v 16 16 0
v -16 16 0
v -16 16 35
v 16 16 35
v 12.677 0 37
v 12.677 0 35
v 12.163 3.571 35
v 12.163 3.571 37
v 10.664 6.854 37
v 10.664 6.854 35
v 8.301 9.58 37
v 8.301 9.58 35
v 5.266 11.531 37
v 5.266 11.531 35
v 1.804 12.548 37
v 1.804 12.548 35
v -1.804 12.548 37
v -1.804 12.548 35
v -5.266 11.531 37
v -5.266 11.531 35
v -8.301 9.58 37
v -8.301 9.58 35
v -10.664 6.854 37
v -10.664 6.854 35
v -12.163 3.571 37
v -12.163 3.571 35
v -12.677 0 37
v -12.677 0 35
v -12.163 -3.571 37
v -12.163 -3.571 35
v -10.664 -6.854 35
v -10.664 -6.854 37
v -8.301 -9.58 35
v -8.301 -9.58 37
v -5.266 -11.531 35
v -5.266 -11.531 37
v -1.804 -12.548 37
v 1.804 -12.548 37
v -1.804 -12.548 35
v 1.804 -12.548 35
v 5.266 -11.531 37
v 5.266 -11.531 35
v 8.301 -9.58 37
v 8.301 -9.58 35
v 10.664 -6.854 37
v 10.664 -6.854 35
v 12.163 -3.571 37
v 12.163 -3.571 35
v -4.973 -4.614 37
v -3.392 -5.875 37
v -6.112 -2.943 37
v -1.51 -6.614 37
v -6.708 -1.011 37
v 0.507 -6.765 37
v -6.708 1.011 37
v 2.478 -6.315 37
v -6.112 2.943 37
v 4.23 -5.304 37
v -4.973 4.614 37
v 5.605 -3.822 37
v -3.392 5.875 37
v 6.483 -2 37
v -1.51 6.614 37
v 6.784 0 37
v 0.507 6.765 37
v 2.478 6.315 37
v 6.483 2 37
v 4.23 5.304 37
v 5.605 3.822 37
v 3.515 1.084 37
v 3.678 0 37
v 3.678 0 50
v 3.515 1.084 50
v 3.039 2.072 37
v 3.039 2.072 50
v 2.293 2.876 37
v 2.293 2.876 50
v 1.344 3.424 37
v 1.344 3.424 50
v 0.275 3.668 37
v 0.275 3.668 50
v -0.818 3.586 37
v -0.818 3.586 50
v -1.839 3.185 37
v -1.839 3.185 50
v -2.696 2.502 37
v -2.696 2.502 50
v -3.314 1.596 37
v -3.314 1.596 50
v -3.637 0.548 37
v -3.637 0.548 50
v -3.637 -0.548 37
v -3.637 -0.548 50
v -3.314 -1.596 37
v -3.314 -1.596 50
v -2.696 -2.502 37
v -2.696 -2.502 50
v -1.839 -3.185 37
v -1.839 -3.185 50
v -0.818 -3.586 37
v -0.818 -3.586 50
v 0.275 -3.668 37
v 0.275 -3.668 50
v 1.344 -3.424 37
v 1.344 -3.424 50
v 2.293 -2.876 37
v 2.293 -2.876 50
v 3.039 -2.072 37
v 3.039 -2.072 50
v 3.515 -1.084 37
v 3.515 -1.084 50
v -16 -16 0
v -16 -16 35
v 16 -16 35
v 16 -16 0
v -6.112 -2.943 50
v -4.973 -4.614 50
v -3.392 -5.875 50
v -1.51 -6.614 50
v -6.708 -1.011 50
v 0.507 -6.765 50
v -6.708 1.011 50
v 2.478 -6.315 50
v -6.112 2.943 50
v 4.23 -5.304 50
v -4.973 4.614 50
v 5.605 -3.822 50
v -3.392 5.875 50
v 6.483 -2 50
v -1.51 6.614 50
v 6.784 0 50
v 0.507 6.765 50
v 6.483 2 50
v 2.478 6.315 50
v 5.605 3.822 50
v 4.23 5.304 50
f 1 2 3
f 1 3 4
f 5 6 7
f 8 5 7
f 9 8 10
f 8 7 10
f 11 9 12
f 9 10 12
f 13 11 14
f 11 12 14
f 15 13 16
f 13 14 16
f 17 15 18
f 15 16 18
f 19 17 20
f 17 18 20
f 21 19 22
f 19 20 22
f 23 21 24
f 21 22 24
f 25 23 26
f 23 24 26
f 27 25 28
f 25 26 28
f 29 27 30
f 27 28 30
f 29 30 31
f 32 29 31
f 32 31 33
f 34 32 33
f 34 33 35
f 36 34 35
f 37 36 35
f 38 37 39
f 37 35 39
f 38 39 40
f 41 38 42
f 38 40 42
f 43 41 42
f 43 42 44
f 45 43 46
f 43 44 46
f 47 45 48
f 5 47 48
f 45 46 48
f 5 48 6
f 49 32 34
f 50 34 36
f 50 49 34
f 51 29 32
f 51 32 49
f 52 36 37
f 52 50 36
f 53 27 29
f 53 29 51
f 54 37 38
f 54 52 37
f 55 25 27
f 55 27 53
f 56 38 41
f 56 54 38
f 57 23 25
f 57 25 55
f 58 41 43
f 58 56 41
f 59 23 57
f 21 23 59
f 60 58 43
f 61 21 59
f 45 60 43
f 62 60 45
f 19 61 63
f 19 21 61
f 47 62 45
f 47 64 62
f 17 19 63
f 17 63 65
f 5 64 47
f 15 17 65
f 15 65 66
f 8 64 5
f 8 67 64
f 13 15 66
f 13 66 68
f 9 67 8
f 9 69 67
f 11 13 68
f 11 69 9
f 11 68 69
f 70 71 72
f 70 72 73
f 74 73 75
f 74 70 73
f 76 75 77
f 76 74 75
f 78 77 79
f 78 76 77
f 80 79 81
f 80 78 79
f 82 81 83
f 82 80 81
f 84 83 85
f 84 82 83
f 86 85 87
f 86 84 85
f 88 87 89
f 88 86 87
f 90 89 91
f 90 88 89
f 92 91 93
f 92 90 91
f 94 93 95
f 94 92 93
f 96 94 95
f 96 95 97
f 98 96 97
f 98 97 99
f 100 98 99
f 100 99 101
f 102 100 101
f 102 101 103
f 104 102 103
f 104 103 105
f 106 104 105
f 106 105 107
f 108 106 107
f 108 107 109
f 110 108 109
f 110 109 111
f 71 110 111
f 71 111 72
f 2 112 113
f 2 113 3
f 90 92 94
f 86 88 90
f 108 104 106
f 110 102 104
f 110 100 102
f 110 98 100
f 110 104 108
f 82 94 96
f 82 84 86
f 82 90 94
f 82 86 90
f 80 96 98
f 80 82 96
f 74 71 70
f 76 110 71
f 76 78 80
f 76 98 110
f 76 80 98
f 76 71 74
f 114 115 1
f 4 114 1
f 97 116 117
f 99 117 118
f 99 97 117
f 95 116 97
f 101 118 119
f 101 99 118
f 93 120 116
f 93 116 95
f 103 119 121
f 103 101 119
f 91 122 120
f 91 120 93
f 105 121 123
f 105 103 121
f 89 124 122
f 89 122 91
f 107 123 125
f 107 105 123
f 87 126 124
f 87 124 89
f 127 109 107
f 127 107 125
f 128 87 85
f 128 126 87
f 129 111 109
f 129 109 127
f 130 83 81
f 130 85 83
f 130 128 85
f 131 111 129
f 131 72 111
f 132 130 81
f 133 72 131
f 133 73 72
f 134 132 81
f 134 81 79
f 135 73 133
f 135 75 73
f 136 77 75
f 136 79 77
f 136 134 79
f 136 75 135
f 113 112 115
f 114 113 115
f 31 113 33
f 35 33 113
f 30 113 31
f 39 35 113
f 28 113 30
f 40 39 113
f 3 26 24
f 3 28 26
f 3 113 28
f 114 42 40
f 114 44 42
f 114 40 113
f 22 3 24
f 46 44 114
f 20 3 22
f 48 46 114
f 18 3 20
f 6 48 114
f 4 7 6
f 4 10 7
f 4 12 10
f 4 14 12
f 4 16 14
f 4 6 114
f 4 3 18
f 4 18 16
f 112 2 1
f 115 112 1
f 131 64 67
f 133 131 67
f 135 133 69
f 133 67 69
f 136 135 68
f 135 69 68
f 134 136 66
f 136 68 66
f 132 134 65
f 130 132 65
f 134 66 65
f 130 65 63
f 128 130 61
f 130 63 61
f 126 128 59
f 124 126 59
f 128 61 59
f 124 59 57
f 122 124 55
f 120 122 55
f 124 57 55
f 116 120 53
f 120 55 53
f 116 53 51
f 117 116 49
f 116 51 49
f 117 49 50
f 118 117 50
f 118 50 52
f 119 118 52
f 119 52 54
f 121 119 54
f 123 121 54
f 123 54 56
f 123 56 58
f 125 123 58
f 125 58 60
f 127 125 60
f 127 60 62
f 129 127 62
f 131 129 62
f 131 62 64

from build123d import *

# Parameters (mm, degrees)
ESQUISSE1_W        = 32
ESQUISSE1_H        = 32
BOSS_EXTRU_1_DEPTH = 35
ESQUISSE2_R        = 6.784029575
ESQUISSE2_R_2      = 3.677937746
BOSS_EXTRU_2_DEPTH = 15
ESQUISSE3_R        = 12.676726104
BOSS_EXTRU_3_DEPTH = 2


with BuildPart() as part:
    # Esquisse1 → Boss.-Extru.1 (new body)
    with BuildSketch(Plane.XY):
        Rectangle(ESQUISSE1_W, ESQUISSE1_H)
    extrude(amount=BOSS_EXTRU_1_DEPTH)

    # Esquisse2 → Boss.-Extru.2 (add)
    with BuildSketch(Plane.XY.offset(35)):
        Circle(ESQUISSE2_R)
        Circle(ESQUISSE2_R_2, mode=Mode.SUBTRACT)
    extrude(amount=BOSS_EXTRU_2_DEPTH)

    # Esquisse3 → Boss.-Extru.3 (add)
    with BuildSketch(Plane.XY.offset(35)):
        Circle(ESQUISSE3_R)
    extrude(amount=BOSS_EXTRU_3_DEPTH)


solid = part.part
